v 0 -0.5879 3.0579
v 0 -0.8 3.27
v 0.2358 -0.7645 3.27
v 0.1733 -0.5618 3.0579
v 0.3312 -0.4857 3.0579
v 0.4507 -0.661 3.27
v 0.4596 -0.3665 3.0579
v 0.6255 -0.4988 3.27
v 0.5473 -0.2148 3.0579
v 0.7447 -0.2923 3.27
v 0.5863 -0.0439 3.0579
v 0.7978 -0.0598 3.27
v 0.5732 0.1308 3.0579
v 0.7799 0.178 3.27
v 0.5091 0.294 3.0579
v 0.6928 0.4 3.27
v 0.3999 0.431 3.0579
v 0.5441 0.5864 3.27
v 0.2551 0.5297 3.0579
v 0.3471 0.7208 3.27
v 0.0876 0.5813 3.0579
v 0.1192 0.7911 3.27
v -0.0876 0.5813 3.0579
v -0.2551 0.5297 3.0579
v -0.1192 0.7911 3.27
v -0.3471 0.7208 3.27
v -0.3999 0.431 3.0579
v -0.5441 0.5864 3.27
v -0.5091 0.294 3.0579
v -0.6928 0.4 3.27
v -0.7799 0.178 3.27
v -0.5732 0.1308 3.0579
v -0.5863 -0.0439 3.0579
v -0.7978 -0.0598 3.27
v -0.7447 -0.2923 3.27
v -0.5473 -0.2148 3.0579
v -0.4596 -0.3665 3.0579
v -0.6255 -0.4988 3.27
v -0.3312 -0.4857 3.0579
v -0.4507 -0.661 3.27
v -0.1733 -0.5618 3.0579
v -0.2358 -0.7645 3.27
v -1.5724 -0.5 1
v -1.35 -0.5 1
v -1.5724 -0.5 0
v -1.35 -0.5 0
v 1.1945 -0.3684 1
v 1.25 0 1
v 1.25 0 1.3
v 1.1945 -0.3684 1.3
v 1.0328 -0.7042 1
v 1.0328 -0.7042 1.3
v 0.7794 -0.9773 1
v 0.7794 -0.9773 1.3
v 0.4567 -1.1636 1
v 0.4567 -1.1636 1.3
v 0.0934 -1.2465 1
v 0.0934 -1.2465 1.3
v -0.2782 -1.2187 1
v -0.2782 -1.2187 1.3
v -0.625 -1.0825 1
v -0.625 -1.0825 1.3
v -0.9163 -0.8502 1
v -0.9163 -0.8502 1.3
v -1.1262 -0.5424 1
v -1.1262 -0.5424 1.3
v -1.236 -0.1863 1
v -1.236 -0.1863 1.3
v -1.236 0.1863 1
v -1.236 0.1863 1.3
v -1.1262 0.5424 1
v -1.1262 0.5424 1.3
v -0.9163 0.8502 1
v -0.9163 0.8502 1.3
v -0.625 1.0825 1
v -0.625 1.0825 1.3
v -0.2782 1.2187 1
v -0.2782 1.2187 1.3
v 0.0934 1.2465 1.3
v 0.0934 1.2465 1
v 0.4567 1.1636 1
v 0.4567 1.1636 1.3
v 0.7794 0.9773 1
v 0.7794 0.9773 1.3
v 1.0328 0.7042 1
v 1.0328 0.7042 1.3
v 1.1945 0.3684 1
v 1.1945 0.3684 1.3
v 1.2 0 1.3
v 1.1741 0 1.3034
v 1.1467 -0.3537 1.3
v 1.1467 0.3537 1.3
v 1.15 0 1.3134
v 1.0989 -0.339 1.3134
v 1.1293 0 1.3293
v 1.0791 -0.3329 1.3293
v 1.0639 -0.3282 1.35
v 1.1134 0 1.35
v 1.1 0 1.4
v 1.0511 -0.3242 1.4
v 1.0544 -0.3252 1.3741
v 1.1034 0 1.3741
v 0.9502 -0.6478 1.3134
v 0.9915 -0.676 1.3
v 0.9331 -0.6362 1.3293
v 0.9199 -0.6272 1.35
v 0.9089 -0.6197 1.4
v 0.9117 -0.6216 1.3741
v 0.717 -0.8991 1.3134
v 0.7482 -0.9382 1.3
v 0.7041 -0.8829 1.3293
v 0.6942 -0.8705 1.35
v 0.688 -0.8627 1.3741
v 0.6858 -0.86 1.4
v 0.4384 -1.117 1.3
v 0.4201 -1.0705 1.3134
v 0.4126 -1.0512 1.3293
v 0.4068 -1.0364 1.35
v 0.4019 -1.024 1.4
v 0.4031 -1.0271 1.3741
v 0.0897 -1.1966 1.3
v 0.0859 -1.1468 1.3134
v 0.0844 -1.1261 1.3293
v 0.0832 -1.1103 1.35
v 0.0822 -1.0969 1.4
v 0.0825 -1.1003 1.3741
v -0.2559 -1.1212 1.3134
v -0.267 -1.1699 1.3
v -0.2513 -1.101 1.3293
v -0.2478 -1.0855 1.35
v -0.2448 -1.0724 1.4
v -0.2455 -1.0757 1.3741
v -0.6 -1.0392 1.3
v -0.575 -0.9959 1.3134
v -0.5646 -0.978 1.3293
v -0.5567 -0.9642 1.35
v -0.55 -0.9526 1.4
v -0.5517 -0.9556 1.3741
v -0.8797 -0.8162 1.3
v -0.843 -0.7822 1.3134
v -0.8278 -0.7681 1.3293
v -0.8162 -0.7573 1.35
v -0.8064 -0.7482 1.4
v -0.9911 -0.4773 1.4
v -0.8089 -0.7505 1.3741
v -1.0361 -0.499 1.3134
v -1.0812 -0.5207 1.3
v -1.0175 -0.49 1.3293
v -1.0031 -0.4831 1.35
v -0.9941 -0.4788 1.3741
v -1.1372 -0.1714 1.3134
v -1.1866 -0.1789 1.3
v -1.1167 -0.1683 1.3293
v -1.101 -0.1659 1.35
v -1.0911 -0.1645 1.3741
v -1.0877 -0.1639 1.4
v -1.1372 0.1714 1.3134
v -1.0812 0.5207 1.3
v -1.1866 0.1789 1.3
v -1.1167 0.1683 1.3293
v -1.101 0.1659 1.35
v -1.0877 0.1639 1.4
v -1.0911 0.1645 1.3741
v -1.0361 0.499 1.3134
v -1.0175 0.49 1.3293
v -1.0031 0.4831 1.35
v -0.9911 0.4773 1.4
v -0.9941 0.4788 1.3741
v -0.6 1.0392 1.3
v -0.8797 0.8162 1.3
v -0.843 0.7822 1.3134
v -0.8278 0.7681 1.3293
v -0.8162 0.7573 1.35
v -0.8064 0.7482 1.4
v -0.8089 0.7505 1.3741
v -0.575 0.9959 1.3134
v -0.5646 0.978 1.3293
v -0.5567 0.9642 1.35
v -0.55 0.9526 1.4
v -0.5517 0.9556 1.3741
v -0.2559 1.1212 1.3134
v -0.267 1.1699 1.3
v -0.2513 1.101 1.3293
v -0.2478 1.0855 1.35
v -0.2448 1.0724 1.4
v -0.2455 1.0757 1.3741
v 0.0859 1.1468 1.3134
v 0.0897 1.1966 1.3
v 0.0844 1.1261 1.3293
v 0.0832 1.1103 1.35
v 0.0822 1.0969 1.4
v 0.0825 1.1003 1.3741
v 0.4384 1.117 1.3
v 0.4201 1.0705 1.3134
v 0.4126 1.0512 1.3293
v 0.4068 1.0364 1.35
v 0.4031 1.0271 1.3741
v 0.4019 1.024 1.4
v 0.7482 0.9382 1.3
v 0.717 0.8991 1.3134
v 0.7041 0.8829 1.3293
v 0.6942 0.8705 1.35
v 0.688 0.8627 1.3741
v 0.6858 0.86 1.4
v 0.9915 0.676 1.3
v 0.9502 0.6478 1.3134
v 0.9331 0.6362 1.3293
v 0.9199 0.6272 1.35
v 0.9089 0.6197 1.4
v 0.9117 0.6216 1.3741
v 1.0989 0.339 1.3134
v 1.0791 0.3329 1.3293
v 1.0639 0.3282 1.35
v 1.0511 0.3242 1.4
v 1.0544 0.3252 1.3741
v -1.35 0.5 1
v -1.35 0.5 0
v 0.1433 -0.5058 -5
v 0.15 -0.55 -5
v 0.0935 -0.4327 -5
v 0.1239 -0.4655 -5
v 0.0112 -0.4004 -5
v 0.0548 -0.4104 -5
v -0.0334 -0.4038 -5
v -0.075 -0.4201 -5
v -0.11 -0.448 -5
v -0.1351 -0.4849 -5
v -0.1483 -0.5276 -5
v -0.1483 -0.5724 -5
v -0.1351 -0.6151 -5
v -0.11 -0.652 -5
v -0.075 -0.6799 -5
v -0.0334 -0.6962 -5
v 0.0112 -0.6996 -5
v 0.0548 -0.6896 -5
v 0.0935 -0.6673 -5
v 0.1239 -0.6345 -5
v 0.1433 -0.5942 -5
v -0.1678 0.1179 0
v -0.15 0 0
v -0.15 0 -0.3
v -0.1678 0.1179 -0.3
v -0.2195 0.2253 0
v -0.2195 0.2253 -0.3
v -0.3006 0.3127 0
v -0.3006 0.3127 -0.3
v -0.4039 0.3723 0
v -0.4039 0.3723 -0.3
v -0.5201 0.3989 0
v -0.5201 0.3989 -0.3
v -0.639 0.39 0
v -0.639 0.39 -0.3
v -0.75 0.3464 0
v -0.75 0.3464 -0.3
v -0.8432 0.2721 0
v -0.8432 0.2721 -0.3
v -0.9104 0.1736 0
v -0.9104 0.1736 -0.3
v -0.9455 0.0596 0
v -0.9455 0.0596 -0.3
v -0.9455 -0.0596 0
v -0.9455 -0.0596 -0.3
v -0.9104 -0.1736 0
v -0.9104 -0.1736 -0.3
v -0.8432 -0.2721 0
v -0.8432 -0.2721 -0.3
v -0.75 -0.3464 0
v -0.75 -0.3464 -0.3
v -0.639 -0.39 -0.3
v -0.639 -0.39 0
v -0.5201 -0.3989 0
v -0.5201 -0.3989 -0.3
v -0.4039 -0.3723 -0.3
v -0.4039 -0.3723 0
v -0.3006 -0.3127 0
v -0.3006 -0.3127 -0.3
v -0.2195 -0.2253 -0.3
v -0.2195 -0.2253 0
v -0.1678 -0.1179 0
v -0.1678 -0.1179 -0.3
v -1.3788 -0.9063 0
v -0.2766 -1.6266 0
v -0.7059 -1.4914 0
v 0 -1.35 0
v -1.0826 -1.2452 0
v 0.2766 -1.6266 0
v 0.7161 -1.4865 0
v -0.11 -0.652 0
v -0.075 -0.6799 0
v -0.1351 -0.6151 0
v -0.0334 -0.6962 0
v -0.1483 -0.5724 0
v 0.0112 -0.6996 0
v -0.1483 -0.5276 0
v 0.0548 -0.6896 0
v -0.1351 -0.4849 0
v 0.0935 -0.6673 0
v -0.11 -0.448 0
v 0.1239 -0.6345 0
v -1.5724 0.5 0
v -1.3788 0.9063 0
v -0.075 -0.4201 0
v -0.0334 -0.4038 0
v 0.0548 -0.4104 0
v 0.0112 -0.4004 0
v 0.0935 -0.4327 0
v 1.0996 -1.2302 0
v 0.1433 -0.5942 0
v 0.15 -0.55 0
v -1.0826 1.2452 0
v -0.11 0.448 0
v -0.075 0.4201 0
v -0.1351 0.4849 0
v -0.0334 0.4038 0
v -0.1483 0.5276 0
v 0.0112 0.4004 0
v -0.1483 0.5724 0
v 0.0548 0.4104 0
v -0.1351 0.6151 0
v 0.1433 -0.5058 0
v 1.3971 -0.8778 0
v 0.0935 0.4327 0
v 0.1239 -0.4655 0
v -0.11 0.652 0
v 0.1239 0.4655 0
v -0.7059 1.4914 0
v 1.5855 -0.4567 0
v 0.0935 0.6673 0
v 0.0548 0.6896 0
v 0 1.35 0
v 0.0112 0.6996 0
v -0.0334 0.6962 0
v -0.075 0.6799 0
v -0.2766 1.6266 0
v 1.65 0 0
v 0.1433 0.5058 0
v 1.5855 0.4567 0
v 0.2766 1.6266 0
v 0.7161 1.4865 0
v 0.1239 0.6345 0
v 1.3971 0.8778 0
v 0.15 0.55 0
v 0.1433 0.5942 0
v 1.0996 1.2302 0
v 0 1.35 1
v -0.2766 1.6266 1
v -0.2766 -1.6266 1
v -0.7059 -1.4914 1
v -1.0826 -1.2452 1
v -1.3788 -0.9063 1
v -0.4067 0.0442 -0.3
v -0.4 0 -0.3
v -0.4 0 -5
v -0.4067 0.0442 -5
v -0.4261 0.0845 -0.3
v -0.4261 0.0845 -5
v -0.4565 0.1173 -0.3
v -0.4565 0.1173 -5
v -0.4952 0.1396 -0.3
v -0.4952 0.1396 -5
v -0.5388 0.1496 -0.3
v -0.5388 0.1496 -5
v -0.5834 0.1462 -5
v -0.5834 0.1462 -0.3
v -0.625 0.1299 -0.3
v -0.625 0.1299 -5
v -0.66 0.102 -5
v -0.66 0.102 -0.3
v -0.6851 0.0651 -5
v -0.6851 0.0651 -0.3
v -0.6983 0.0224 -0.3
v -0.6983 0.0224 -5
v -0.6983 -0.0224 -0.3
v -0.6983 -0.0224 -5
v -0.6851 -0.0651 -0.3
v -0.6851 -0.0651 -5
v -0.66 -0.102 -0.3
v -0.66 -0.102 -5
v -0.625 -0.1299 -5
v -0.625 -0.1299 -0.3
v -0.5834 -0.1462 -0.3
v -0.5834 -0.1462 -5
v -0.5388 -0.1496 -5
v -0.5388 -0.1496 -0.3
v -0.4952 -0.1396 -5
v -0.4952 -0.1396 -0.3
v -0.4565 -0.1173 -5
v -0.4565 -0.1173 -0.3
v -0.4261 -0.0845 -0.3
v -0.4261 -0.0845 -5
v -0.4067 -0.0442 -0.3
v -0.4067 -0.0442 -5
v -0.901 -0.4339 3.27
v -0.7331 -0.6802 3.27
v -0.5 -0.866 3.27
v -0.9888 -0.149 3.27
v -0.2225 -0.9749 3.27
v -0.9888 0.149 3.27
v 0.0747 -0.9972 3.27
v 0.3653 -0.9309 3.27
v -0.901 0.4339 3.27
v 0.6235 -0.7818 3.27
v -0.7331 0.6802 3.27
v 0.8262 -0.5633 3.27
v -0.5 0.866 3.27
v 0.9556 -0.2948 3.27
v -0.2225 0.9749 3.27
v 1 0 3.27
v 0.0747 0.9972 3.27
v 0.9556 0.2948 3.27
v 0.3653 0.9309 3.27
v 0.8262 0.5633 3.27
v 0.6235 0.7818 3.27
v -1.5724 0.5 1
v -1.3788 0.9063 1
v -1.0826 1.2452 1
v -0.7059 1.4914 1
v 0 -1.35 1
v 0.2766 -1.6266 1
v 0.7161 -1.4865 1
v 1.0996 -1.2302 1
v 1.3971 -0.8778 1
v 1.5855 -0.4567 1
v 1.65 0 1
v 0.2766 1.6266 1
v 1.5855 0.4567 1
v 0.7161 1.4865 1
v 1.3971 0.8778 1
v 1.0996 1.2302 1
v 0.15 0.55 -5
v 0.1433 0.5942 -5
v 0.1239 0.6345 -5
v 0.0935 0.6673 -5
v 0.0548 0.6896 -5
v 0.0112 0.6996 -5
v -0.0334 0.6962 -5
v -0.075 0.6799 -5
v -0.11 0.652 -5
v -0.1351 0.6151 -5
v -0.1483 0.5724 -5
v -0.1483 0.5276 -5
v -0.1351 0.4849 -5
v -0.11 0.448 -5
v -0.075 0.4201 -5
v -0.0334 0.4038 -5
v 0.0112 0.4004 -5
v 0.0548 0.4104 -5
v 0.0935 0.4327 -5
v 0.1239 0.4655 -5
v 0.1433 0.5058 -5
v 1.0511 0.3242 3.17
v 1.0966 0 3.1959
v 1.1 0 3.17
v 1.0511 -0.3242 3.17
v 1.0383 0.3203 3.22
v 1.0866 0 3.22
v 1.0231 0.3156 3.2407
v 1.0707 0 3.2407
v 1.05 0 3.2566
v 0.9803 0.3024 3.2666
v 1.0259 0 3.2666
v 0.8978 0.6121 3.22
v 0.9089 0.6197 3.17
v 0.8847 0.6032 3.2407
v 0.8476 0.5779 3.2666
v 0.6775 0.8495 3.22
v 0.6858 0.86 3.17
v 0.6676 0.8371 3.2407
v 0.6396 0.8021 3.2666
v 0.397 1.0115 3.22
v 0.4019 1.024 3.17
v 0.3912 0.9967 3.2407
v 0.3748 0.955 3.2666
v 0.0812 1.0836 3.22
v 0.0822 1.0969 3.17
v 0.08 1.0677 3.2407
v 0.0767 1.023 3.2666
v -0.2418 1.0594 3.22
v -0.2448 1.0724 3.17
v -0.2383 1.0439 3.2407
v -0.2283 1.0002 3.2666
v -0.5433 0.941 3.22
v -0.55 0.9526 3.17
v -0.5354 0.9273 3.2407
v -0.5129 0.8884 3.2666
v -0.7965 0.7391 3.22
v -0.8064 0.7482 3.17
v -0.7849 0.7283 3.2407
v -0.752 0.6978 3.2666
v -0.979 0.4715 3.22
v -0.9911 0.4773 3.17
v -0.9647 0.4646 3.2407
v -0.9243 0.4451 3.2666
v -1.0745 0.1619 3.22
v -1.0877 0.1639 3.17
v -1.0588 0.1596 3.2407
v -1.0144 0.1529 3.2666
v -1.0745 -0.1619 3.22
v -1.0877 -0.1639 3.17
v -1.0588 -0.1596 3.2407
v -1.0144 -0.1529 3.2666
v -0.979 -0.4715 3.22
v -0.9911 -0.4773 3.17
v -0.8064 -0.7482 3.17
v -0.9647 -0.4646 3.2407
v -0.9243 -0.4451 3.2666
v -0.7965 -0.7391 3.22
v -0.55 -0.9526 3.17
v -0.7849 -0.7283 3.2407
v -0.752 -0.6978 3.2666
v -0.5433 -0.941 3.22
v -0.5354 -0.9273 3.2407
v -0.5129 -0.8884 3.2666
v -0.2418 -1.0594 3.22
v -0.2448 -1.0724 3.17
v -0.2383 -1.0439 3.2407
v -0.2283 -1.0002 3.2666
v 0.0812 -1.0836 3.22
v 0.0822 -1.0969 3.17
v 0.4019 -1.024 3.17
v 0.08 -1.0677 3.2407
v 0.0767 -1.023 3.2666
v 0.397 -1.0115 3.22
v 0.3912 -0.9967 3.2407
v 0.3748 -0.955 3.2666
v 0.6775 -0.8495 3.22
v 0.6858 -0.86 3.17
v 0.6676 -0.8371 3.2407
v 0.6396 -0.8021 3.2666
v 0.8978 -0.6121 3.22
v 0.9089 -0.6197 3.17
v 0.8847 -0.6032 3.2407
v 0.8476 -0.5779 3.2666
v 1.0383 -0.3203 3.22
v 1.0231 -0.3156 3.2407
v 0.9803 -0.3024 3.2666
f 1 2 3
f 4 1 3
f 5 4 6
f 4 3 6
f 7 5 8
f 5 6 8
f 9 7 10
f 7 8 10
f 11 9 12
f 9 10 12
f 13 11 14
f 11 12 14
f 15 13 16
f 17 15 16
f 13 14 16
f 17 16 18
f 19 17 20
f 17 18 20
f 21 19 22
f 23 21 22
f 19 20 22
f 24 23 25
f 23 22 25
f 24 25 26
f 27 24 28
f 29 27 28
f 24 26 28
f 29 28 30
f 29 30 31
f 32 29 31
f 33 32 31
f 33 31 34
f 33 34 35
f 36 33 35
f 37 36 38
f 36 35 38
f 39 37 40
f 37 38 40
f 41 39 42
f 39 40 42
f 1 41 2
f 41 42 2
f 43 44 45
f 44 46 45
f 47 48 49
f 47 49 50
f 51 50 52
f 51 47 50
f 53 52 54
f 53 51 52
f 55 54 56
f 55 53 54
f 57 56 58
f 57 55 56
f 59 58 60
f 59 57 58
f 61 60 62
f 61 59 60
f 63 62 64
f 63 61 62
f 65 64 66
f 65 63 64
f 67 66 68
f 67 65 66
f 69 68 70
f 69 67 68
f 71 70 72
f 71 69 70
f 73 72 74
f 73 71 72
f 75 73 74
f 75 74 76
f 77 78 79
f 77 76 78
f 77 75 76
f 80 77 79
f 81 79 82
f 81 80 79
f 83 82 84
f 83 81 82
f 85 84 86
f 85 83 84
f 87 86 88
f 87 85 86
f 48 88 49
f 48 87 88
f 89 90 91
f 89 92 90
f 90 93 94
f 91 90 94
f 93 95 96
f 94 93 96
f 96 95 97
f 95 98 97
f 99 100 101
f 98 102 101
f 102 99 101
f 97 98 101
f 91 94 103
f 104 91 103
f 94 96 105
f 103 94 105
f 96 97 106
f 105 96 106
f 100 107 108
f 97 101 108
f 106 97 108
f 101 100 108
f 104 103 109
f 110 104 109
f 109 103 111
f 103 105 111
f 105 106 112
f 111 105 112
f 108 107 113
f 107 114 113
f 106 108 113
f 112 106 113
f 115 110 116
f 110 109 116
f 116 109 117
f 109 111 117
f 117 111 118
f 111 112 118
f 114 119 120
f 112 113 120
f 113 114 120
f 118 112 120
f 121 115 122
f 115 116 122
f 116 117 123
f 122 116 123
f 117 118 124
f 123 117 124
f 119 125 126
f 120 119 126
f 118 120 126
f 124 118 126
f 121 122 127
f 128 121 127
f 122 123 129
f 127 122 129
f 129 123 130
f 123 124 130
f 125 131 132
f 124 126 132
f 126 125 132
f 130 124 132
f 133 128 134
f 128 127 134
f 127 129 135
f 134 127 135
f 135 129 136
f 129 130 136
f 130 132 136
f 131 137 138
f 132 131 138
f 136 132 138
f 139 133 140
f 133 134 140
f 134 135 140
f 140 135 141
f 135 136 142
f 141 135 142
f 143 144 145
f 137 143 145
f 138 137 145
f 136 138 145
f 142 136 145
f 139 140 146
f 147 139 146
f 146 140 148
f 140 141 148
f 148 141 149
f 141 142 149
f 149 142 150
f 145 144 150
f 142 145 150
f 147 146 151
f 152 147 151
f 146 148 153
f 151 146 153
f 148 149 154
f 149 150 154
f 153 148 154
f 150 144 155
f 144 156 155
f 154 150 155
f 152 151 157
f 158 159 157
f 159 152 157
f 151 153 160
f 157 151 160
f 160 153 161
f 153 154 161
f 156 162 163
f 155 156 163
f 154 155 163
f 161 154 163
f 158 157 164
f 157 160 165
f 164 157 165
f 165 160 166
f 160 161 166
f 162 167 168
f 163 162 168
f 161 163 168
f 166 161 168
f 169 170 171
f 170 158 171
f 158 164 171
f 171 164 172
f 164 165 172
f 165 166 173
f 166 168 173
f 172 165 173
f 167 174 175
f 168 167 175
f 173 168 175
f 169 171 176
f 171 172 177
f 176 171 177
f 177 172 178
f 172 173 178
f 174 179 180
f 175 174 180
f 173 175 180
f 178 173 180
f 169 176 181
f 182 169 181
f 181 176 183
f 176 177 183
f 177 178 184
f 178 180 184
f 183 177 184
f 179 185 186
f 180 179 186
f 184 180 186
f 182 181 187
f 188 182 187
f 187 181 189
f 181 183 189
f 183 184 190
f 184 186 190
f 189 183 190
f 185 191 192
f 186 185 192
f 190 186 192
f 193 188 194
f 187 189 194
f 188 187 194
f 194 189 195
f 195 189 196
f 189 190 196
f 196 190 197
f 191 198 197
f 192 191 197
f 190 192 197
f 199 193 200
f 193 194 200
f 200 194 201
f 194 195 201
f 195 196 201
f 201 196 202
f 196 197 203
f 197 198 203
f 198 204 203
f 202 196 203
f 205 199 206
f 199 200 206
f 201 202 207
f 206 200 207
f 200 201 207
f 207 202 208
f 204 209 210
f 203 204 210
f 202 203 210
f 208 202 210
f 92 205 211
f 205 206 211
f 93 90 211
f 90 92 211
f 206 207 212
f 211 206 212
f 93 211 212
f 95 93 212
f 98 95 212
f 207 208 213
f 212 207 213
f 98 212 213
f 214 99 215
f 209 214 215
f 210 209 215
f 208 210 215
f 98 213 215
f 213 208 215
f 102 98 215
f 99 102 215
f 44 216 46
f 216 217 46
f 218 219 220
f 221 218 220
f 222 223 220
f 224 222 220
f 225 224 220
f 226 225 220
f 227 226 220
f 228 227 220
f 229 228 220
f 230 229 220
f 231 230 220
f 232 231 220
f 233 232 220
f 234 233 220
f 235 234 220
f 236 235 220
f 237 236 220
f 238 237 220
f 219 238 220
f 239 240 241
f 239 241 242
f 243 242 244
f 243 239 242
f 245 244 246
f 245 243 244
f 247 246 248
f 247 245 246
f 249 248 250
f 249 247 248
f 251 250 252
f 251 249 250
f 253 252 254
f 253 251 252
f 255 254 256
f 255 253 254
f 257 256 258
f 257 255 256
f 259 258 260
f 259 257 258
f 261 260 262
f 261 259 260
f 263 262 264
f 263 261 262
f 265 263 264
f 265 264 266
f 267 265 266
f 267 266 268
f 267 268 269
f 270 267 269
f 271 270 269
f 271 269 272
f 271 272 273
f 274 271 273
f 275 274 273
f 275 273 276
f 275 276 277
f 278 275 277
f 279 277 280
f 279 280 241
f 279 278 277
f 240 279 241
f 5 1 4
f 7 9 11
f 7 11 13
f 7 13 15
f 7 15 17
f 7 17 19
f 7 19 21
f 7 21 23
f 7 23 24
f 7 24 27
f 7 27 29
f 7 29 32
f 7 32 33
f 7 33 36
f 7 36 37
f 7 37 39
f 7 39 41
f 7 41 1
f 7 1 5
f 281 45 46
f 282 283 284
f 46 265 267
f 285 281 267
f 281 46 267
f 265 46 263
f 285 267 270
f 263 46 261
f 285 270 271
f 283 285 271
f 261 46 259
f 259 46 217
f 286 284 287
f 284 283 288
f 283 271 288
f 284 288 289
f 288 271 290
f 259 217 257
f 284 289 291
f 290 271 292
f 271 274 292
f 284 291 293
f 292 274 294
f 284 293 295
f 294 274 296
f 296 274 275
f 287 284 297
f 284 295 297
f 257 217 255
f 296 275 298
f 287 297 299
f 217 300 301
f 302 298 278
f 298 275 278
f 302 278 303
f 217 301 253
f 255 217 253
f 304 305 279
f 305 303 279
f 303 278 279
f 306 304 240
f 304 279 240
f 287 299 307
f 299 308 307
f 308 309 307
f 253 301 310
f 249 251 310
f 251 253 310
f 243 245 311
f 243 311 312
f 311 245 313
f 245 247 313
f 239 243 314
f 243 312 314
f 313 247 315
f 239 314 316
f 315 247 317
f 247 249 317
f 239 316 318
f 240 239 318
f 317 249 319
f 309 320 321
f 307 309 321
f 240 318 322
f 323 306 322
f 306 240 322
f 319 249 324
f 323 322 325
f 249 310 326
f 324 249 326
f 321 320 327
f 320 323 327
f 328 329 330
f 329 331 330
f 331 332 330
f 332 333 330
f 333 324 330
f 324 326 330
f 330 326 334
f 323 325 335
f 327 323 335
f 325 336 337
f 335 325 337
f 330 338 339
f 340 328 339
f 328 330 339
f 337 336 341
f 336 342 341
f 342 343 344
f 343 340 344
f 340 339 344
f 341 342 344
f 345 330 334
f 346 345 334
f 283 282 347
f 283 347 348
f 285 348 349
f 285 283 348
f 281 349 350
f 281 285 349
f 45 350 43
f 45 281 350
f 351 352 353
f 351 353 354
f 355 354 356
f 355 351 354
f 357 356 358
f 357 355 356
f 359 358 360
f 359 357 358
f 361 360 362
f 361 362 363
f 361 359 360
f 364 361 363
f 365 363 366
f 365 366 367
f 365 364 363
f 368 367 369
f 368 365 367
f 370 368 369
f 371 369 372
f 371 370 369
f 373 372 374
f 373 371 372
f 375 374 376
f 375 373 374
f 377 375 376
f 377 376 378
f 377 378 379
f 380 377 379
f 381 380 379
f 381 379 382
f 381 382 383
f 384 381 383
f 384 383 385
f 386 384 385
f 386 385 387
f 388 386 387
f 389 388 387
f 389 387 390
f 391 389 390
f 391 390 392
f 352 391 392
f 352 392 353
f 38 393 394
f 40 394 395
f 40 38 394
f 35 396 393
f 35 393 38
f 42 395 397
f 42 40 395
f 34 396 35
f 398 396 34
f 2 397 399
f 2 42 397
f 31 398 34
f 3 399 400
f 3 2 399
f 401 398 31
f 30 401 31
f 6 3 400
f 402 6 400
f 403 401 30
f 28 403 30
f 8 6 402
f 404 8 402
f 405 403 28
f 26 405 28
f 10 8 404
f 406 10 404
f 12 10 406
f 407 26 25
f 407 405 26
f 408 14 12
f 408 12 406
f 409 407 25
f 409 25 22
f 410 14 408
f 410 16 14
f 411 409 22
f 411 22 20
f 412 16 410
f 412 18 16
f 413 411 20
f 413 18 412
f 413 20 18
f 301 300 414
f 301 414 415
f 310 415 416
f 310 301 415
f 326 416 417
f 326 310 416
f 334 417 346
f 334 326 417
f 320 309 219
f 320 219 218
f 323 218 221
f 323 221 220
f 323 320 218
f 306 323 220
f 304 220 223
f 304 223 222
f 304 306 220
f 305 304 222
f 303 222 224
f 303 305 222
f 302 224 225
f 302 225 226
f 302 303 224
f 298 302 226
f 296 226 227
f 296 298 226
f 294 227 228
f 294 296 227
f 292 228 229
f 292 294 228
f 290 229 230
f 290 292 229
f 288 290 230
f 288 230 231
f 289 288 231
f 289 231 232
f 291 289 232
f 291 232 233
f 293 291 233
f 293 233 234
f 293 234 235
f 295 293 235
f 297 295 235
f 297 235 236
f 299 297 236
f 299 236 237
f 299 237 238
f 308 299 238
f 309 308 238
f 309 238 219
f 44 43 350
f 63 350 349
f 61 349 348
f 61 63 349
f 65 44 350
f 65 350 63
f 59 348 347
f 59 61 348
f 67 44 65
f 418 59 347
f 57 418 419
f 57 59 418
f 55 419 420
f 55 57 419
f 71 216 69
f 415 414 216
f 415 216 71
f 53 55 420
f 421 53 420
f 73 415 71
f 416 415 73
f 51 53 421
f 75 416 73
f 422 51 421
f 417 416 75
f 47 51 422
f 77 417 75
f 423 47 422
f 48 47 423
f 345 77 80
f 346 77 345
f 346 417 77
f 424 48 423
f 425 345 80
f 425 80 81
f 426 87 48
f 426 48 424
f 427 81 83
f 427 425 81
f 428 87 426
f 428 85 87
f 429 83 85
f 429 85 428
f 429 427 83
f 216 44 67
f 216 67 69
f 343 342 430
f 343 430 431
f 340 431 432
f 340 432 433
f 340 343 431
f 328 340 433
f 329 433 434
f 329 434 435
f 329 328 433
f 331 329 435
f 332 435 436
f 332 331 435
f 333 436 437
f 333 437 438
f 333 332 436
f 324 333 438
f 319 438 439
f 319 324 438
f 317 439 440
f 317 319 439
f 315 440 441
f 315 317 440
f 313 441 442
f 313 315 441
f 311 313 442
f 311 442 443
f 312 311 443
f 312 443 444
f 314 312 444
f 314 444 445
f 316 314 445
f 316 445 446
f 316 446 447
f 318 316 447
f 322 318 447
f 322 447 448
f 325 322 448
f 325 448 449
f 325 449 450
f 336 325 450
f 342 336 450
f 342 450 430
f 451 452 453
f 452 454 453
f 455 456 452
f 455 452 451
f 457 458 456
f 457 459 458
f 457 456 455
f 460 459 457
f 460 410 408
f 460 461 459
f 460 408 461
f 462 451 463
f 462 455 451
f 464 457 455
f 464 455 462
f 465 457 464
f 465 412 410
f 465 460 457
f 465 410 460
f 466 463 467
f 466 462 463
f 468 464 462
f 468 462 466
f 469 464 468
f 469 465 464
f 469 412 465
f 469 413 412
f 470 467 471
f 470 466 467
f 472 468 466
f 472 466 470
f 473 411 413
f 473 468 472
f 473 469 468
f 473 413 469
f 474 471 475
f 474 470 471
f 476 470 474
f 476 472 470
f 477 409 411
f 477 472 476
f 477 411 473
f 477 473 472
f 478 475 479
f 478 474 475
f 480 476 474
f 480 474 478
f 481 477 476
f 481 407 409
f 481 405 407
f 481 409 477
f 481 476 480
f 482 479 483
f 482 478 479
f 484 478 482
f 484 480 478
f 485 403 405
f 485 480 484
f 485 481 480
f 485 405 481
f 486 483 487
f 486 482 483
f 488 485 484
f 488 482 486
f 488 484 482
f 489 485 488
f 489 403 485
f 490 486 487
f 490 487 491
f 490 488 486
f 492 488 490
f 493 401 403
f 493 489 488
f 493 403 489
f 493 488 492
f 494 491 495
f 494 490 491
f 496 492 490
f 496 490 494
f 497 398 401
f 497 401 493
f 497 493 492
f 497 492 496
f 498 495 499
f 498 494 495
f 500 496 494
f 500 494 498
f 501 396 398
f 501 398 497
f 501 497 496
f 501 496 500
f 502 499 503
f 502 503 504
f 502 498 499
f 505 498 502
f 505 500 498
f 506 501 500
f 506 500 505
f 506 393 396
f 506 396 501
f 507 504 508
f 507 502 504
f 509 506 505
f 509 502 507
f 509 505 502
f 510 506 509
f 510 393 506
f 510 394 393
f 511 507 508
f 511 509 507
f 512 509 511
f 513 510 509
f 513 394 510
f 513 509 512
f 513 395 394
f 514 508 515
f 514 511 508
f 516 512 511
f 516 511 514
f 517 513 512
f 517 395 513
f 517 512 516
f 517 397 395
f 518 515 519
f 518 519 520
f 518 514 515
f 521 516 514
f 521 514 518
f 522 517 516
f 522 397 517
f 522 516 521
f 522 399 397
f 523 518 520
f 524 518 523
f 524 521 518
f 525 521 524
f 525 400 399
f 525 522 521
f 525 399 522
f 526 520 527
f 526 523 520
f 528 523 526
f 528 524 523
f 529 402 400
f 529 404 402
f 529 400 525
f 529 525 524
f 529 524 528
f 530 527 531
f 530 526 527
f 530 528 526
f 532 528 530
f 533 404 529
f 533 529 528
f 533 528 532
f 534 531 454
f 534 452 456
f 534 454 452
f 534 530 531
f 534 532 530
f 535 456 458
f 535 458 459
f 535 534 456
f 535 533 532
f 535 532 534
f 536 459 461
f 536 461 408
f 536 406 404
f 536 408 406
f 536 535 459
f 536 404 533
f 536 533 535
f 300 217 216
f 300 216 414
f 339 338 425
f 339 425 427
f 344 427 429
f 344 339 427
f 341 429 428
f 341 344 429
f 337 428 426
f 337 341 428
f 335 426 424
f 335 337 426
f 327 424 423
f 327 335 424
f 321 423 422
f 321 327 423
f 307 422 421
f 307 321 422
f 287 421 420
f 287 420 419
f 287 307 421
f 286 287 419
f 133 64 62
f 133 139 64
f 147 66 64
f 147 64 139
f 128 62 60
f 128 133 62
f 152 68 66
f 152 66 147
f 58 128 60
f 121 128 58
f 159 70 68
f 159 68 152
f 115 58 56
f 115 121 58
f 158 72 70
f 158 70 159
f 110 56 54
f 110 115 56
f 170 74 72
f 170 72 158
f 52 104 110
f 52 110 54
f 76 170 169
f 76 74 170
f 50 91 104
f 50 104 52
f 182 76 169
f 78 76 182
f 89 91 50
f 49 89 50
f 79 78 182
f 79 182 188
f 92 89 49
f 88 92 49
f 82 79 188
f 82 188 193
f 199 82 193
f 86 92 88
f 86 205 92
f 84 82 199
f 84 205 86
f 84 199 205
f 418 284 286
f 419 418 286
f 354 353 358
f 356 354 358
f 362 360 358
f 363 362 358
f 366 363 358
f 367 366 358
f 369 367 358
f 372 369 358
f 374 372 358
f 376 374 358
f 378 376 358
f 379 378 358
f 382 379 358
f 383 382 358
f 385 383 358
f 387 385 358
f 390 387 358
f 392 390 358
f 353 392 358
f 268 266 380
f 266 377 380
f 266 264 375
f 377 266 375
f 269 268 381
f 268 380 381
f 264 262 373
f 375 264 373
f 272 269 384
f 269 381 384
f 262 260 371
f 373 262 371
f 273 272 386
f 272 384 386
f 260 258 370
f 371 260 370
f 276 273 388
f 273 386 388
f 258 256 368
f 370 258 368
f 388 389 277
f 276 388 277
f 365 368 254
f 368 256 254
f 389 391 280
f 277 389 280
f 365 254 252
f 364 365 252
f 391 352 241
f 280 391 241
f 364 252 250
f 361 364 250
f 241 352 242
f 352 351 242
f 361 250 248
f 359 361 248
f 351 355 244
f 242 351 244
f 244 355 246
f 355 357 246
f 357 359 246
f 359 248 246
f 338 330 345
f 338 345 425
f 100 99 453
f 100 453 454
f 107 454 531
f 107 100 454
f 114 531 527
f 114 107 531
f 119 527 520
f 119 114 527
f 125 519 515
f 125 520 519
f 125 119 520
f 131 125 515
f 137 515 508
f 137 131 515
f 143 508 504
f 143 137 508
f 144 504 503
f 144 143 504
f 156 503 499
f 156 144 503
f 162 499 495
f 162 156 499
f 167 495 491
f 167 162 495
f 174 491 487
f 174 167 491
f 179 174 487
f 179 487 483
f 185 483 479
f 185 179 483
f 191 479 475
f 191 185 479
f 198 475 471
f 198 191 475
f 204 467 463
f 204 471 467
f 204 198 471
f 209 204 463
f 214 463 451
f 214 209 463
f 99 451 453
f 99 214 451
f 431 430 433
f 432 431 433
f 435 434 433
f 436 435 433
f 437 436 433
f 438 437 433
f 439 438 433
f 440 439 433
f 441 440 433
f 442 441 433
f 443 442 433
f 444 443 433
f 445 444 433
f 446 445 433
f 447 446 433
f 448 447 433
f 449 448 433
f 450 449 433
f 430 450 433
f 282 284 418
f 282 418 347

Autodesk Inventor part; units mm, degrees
ref_plane "YZ Plane" through (0, 0, 0) normal (1, 0, 0) x (0, 1, 0)
ref_plane "XZ Plane" through (0, 0, 0) normal (0, 1, 0) x (-1, 0, 0)
ref_plane "XY Plane" through (0, 0, 0) normal (0, 0, 1) x (1, 0, 0)
sketch "草图1" plane through (0, 0, 0) normal (0, 0, 1) x (1, 0, 0)
  circle A0 centre (0, 0) radius 1.65
  circle A1 centre (0, 0) radius 0.55 construction
  line L0 (0, 1.65) -> (0, 1.35)
  line L1 (0, 1.35) -> (0.2766, 1.6266)
  line L2 (0, 1.35) -> (-0.2766, 1.6266)
  line L3 (0, 1.35) -> (0.3912, 1.35) construction
  line L4 (0, 0) -> (0, 1.65) construction
  line L5 (0, 0) -> (-1.65, 0) construction
  line L6 (0, 0) -> (0, -1.65) construction
  circle A2 centre (0, 0.55) radius 0.15
  circle A3 centre (0, -0.55) radius 0.15
  circle A4 centre (-0.55, 0) radius 0.15
  circle A5 centre (-0.55, 0) radius 0.4
  line L7 (0, -1.65) -> (0, -1.35)
  line L8 (0, -1.35) -> (0.2766, -1.6266)
  line L9 (0, -1.35) -> (-0.2766, -1.6266)
  line L10 (0, -1.35) -> (0.3912, -1.35) construction
  line L11 (-1.35, 0) -> (-1.35, 0.5)
  line L12 (-1.35, 0.5) -> (-1.5724, 0.5)
  line L13 (-1.35, 0) -> (-1.35, -0.5)
  line L14 (-1.35, -0.5) -> (-1.5724, -0.5)
  point P0 (-0.2766, -1.6266)
  point P1 (0.2766, -1.6266)
  dimension "d0" = 3.3
  dimension "d1" = 1.1
  dimension "d5" = 0.3
  dimension "d6" = 45
  dimension "d7" = 135
  dimension "d8" = 0.3
  dimension "d9" = 0.3
  dimension "d10" = 0.3
  dimension "d11" = 0.8
  dimension "d12" = 0.5
  dimension "d13" = 0.5
  dimension "d14" = 0.3
extrude "拉伸1" add sketch "草图1" along normal blind 1 contours A0 L8 L9 L14 L13 L11 L12 L2 L1 | A2 | A3 | A4 | A5
extrude "拉伸2" add sketch "草图1" against normal blind 5 contours A2 | A3 | A4
extrude "拉伸3" add sketch "草图1" against normal blind 0.3 contours A5
sketch "草图2" plane through (0, 0, 1) normal (0, 0, 1) x (1, 0, 0)
  circle A0 centre (0, 0) radius 1.1
  circle A1 centre (0, 0) radius 1.25
  dimension "d21" = 2.2
  dimension "d22" = 2.5
extrude "拉伸4" add sketch "草图2" along normal blind 2.27 contours A0
extrude "拉伸5" add sketch "草图2" along normal blind 0.3
sketch "草图3" plane through (0, 0, 0) normal (1, 0, 0) x (0, 1, 0)
  line L0 (1.1, 3.27) -> (-1.1, 3.27) projected
  line L1 (0, 3.27) -> (-0.8, 3.27)
  line L2 (-0.8, 3.27) -> (-0.5879, 3.0579)
  line L3 (-0.5879, 3.0579) -> (0, 3.0579)
  line L4 (0, 3.0579) -> (0, 3.27)
  point P0 (0, 0)
  dimension "d27" = 0.8
  dimension "d28" = 0.3
  dimension "d29" = 45
revolve "旋转1" cut sketch "草图3" angle 360 about axis through (0, 0, 3.0579) along (0, 0, 1)
fillet "圆角1" radius 0.1 2 edges at (-1.1, 0, 3.27) (-1.1, 0, 1.3)
properties part number "CAN_φ3.3" material "黄铜，软黄"
